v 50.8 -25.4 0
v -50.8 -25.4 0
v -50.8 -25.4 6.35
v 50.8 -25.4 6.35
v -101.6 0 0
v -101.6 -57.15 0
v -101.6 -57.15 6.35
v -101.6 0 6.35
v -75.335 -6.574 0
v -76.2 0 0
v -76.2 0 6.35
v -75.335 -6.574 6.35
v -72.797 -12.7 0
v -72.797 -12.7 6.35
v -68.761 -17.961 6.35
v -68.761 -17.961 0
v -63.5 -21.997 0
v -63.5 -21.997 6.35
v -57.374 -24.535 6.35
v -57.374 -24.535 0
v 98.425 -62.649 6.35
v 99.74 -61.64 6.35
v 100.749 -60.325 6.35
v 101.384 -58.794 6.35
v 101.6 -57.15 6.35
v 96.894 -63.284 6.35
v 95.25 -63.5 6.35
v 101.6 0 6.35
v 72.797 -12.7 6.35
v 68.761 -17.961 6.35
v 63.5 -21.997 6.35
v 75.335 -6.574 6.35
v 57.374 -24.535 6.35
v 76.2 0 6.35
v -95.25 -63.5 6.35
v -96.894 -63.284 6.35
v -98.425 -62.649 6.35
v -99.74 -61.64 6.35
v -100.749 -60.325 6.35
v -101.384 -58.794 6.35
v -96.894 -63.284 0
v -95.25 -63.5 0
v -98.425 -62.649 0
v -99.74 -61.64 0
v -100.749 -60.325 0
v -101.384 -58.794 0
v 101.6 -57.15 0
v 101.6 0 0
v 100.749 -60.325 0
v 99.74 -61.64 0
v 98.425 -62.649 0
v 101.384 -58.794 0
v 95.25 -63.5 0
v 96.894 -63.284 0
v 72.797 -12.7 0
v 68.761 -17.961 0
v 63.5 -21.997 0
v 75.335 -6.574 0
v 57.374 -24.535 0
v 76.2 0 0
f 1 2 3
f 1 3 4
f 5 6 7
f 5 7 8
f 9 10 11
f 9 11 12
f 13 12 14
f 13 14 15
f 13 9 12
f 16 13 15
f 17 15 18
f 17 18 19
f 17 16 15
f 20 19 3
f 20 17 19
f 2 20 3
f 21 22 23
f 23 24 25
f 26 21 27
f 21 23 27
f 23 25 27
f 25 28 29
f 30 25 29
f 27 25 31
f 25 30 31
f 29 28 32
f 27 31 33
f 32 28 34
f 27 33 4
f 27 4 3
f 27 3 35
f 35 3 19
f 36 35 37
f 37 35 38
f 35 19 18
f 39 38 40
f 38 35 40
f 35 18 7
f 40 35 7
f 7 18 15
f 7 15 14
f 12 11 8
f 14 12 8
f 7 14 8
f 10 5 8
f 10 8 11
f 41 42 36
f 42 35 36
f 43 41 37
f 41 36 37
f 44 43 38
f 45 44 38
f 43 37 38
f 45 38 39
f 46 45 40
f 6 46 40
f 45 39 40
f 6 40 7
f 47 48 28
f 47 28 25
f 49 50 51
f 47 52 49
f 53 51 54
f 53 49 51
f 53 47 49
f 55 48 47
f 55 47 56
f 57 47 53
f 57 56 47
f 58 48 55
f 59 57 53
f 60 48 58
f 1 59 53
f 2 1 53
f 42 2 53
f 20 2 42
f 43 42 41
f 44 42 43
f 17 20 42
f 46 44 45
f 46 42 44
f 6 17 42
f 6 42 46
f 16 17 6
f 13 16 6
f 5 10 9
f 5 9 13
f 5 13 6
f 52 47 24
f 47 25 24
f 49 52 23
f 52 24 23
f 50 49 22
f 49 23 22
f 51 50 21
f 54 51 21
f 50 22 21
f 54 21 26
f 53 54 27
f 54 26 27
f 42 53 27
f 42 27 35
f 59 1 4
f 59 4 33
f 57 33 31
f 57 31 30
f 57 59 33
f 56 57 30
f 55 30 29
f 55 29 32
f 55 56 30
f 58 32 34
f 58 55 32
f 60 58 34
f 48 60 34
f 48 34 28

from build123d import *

# Parameters (mm, degrees)
EXTRUDE1_DEPTH = 6.35
FILLET1_R      = 6.35


with BuildPart() as part:
    # Sketch1 → Extrude1 (new body)
    with BuildSketch(Plane.XY):
        with BuildLine():
            Line((-101.6, 0), (-76.2, 0))
            ThreePointArc((-76.2, 0), (-68.760512242, -17.960512242), (-50.8, -25.4))
            Line((-50.8, -25.4), (50.8, -25.4))
            ThreePointArc((50.8, -25.4), (68.760512242, -17.960512242), (76.2, 0))
            Line((76.2, 0), (101.6, 0))
            Line((101.6, 0), (101.6, -63.5))
            Line((101.6, -63.5), (-101.6, -63.5))
            Line((-101.6, -63.5), (-101.6, 0))
        make_face()
    extrude(amount=EXTRUDE1_DEPTH)

    # Fillet1
    fillet1_edges = [part.edges().sort_by_distance(p)[0] for p in [
        (101.6, -63.5, 3.175),
        (-101.6, -63.5, 3.175),
    ]]
    fillet(fillet1_edges, radius=FILLET1_R)


solid = part.part
